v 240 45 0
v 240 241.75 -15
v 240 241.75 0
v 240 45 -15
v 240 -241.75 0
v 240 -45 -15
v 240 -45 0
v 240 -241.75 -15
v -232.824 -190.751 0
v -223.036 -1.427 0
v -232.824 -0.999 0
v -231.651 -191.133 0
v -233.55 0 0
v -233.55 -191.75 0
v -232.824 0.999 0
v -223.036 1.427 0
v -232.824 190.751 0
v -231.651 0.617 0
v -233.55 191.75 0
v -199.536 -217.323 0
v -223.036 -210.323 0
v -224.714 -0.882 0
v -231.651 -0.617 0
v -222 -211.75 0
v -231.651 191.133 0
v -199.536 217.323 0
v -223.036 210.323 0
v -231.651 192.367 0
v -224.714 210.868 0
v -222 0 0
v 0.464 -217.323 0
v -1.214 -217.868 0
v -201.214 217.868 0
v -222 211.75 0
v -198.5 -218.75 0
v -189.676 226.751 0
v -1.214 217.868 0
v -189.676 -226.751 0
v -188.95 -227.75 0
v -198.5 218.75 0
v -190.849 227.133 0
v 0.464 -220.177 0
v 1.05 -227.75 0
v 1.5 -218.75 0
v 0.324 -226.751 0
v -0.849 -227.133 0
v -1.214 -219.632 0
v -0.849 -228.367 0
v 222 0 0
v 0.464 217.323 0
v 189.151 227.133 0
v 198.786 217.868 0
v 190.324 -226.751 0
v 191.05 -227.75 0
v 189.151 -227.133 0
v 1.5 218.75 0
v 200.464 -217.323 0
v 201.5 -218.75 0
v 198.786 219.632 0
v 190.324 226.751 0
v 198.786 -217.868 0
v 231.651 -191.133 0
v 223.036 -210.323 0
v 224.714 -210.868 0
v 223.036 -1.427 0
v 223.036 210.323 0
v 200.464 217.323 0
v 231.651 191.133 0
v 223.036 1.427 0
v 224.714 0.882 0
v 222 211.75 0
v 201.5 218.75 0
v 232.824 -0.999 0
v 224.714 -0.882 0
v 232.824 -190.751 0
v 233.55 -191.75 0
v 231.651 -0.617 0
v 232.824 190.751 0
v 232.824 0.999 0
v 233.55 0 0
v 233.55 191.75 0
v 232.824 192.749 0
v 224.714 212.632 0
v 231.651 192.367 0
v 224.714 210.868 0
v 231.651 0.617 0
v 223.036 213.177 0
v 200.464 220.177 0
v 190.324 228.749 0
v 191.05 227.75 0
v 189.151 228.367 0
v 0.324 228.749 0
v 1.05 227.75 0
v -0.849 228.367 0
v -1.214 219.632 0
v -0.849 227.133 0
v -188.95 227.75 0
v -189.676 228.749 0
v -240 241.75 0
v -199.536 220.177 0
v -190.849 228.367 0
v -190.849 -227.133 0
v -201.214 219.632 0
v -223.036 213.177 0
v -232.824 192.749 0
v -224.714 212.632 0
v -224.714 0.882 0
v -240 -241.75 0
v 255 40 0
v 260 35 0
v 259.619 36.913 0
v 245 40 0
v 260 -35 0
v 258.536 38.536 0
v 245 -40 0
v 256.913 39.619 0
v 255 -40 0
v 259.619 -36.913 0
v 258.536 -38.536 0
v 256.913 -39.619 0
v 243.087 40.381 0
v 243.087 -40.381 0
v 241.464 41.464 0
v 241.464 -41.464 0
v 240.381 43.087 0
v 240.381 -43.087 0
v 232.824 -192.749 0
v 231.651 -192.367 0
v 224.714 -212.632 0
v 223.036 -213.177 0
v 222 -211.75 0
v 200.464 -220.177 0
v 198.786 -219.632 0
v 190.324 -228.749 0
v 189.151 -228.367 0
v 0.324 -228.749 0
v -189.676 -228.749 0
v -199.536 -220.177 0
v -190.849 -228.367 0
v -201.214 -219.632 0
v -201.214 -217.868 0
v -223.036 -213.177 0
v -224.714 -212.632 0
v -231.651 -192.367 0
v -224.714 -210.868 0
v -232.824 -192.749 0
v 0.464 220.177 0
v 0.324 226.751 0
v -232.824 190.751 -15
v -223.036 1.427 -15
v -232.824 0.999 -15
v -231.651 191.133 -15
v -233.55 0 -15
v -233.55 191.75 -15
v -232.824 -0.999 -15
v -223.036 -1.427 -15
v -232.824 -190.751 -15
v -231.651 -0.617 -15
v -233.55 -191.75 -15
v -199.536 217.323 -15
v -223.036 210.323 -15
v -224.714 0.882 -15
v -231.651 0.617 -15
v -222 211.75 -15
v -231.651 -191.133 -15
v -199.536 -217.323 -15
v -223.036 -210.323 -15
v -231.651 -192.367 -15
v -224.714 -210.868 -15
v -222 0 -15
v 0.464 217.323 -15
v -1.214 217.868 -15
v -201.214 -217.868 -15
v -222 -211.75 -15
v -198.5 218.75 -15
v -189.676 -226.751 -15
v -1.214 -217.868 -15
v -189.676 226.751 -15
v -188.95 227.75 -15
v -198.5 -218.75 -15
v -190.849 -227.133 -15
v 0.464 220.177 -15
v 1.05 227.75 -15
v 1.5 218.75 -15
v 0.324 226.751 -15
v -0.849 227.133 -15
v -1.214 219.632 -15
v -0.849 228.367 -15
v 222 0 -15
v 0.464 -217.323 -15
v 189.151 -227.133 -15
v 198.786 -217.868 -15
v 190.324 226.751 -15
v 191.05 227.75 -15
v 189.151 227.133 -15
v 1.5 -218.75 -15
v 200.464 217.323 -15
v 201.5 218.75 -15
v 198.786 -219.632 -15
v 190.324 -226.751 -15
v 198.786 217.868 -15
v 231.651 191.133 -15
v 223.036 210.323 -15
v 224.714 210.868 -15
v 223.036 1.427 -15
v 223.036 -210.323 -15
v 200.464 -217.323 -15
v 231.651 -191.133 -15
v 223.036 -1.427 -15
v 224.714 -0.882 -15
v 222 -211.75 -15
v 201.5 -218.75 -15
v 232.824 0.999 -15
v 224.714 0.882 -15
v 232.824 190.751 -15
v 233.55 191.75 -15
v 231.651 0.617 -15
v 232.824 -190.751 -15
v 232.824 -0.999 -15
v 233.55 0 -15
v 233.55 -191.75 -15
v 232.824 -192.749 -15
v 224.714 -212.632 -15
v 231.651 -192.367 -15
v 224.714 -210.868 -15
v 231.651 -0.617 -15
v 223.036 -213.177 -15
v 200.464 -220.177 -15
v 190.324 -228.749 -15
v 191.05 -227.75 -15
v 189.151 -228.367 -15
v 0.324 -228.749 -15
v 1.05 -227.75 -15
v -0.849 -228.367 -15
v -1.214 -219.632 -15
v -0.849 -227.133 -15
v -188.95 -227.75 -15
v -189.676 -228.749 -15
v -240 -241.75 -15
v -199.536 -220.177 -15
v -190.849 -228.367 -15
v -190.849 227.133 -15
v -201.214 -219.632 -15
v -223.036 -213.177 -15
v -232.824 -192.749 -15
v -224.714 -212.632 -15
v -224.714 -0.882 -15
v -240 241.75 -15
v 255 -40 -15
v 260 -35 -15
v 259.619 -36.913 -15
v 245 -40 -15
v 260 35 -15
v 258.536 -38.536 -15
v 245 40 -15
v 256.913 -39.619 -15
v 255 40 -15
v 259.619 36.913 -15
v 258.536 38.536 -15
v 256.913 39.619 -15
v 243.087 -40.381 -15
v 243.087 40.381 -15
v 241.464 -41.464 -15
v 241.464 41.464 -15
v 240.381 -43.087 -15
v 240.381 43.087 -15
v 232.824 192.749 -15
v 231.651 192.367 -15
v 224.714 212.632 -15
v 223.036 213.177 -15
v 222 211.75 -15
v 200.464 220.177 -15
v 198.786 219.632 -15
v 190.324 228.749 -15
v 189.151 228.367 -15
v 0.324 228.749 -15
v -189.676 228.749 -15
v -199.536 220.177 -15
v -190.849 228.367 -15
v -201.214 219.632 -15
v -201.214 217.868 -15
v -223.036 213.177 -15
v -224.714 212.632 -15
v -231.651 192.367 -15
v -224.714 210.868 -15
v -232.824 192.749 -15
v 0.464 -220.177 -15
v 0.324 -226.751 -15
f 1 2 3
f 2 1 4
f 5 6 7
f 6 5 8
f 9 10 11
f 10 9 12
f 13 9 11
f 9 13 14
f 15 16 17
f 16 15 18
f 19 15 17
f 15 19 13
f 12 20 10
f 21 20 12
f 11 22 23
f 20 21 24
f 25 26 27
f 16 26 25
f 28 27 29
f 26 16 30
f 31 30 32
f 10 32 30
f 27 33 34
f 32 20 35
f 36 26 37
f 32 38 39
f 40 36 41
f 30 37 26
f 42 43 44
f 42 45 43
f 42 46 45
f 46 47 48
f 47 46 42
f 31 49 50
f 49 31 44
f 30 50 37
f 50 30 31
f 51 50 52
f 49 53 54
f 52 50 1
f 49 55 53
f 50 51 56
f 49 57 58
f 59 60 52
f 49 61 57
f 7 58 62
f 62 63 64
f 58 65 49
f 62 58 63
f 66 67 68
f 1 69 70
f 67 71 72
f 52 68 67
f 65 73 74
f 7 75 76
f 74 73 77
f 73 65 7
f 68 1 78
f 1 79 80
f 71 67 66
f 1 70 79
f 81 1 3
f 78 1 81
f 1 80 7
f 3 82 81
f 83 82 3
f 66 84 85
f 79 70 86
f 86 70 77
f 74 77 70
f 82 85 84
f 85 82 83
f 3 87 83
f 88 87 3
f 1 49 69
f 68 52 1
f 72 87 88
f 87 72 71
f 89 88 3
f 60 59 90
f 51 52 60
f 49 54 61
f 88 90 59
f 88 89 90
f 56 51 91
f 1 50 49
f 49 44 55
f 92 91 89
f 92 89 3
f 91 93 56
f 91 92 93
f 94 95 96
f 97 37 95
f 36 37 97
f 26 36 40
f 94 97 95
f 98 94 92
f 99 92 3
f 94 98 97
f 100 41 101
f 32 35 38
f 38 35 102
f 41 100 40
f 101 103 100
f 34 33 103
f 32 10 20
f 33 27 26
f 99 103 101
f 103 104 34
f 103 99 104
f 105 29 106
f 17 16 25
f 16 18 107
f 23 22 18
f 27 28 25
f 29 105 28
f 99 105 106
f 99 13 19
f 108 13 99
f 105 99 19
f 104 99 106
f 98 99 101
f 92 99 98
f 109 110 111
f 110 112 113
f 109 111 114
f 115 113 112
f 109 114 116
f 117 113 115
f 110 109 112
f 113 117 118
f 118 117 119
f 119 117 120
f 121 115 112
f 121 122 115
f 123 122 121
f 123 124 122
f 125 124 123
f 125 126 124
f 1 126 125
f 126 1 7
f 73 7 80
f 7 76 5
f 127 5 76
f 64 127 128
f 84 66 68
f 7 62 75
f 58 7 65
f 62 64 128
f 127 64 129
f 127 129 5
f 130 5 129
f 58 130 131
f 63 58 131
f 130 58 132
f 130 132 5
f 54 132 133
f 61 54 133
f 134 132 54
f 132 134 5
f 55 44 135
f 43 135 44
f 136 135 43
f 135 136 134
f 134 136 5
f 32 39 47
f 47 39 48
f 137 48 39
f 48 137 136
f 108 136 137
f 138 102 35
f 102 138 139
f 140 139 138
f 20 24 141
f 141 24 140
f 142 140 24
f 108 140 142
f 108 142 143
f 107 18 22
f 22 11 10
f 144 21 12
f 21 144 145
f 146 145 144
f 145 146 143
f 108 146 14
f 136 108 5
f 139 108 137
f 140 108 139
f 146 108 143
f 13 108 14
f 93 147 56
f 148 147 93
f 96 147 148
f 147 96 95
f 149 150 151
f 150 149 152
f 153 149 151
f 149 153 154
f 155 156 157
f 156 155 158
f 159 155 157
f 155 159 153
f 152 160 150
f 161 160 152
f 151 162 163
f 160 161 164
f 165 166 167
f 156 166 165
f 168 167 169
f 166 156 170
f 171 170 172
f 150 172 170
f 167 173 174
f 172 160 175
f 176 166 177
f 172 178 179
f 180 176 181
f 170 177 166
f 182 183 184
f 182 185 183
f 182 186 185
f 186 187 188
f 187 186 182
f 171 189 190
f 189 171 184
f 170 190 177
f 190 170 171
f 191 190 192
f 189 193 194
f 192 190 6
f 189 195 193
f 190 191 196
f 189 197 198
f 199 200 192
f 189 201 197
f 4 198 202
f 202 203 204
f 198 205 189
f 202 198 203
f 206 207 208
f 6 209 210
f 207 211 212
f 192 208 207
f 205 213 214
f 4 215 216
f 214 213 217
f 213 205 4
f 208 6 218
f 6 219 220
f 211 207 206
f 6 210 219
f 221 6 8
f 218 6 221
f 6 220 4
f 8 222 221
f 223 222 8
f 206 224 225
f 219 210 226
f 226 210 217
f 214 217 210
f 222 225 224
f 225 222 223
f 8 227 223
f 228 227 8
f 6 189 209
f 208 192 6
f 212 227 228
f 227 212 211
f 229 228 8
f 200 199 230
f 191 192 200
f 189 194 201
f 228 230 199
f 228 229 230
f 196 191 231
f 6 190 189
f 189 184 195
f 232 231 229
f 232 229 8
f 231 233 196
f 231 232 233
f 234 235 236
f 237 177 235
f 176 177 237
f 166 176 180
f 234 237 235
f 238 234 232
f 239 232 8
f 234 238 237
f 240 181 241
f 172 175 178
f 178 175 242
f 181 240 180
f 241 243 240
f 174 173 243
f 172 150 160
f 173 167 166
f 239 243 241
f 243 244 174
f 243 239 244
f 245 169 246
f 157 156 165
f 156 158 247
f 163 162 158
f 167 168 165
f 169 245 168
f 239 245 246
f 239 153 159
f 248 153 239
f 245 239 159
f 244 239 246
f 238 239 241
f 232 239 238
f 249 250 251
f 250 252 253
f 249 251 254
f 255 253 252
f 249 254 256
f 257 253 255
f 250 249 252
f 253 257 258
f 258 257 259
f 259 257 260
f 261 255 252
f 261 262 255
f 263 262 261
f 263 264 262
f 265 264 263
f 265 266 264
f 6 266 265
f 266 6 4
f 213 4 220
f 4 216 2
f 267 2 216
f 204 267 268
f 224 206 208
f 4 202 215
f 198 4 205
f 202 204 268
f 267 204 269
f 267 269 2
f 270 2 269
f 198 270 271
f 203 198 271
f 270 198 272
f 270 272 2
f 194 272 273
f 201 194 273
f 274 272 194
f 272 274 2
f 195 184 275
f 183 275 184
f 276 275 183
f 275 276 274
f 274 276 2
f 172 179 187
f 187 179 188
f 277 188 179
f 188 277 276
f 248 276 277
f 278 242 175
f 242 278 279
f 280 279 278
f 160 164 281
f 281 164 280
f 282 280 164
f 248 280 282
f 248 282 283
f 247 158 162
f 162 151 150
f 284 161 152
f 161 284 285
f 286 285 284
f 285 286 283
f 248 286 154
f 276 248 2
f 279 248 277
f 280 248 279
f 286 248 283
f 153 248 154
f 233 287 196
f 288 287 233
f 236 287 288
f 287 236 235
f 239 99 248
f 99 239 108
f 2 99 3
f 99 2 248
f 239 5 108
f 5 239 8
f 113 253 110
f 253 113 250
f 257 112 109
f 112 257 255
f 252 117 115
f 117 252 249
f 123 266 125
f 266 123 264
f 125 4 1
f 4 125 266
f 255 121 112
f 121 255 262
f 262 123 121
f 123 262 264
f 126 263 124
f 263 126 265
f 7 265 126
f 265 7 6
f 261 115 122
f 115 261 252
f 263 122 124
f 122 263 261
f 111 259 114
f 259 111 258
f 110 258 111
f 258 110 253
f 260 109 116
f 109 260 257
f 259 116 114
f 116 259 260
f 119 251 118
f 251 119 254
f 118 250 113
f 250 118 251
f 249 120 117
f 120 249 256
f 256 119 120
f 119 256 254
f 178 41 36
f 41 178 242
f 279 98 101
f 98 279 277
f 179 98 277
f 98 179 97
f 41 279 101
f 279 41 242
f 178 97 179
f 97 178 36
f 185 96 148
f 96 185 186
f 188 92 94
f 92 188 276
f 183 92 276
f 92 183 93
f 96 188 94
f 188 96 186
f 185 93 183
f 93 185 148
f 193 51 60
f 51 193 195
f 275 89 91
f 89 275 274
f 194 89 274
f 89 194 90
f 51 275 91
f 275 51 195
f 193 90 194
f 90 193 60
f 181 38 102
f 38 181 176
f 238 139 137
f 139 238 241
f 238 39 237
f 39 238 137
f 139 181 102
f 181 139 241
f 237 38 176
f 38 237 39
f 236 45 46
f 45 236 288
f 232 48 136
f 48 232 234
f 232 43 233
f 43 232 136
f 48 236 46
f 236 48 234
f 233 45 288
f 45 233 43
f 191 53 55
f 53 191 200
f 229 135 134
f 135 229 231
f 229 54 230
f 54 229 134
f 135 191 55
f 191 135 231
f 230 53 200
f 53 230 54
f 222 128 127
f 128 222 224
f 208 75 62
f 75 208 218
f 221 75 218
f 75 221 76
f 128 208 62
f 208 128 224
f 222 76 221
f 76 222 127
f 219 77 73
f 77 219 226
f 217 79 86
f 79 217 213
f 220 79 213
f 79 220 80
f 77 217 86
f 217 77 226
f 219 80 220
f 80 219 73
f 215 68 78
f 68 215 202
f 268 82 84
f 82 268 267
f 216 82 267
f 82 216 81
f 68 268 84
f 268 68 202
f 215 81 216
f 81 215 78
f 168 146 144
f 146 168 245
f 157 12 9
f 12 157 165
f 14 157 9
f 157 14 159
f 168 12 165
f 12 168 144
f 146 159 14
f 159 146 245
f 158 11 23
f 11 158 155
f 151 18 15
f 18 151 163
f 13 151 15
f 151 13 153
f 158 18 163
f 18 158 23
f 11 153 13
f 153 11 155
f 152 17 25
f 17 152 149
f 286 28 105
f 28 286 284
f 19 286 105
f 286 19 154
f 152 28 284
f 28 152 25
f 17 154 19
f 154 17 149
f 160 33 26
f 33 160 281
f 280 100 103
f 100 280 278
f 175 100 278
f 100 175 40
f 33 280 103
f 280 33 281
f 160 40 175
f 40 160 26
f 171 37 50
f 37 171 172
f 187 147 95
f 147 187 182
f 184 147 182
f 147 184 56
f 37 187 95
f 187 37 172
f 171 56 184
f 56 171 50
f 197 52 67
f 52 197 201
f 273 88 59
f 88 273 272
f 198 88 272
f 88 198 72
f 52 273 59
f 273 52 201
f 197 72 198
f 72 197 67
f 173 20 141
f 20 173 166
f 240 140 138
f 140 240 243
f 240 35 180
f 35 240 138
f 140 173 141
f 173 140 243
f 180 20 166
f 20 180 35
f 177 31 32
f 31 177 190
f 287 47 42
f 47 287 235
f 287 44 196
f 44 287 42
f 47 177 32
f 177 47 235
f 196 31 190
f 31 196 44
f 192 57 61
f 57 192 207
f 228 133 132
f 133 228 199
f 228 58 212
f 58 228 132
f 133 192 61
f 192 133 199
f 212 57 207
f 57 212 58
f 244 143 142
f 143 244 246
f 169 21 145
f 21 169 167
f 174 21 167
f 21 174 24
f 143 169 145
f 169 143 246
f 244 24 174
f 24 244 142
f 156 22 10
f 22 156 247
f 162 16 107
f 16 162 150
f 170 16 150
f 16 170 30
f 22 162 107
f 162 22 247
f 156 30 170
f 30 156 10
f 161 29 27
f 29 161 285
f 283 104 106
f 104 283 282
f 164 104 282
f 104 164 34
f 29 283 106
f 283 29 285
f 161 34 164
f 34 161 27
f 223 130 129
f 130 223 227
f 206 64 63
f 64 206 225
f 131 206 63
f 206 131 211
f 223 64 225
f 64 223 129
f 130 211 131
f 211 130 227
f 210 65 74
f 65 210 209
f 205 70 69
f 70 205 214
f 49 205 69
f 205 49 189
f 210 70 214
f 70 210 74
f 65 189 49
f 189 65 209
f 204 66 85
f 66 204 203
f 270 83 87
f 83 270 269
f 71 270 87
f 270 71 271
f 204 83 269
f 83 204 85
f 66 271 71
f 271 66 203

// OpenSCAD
// file: variabile.scad
//parametrii generali
latime_exterioara_dulap = 500; //mm
adancime_exterioara_dulap = 500; //mm
inaltime_utila_segment_dulap = 90; //inaltimea utila minima
numar_segmente_dulap = 4;

//definitii legate de materiale
grosime_exterior_dulap = 15;
grosime_fund_sertar = 15;
grosime_laterale_sertar = 15;

//gauri de surub si cap surub
diametru_gauri_holzsurub = 2.1;
diametru_gauri_surub = 2.1; //doar pt ghidare, dau gaura cu 8mm lemn
diametru_cap_surub = 20;
// calculez adancimea din datele surubului
lungime_filet_surub = 20; //mm
lungime_filet_ramas = 10; //mm, cat ramane pentru piulita
adancime_cap_surub = (grosime_laterale_sertar - (lungime_filet_surub-lungime_filet_ramas)/2);
echo();
echo("adancime_cap_surub:", adancime_cap_surub);
echo();

// dimensiuni slot-uri
grosime_slot_sertar = grosime_fund_sertar + 1; //1mm toleranta
adancime_slot_sertar = 6;

/*
    variabile specifice dulapului exterior
*/
//variabile specifice lateralei de dulap
inaltime_initiala = 1;// primul slot pleaca putin deasupra fundului
inaltime_segment_dulap = inaltime_utila_segment_dulap + grosime_slot_sertar;
inaltime_laterala = 2*grosime_exterior_dulap + inaltime_initiala + inaltime_segment_dulap*numar_segmente_dulap;
echo();
echo("inaltime_segment_dulap: ",inaltime_segment_dulap);
echo("inaltime_laterala: ",inaltime_laterala);
echo();

numar_suruburi_capace_sus_jos = 5;
offset_suruburi_capace_sus_jos = 30; // de la marginea placii la centrul primei gauri
//distanta_fata_de_centru_gauri_laterale = 100;
distanta_fata_de_centru_gauri_laterale =adancime_exterioara_dulap/3;
pozitie_gauri_de_sus = 2; // sloturi
pozitie_gauri_de_jos = 1; // sloturi


//variabile specifice capacelor de sus si jos
adancime_capac_sus_jos = adancime_exterioara_dulap; //mm
latime_capac_sus_jos = latime_exterioara_dulap - 2*grosime_exterior_dulap;
numar_suruburi_capac_fund = 5; // in cate suruburi fixez fundul
offset_suruburi_fund = 30; // de la marginea bucatii la centrul primei gauri
distanta_suruburi_fixare_module_sus_jos = adancime_capac_sus_jos/3; //mm

gauri_fixare_picioare = true;
distanta_gauri_picioare_centru_centru = 50;
latime_suport_picioare = 80;
offset_fata = 30; // de la marginea din fata 
offset_laterala = 30; // de la peretele lateral


//variabile specifice fundului de dulap
distanta_suruburi_fixare_fund = 200; //mm or undef if not required
adancime_fund = inaltime_laterala - 2*grosime_exterior_dulap;
latime_fund = latime_exterioara_dulap - 2*grosime_exterior_dulap;




/*
    variabile specifice sertarelor
*/
// trebui ajustata in functie de dulap si grosimile reale
// la placajul meu,se mai aduna 2mm 
toleranta_fund_sertar_laterale = -1.5;//mm - se imparte la 2 pt cele 2 margini
toleranta_adancime_fund_sertar = 5;//mm - sertarul e putin mai scurt
toleranta_pereti_sertar = 0.5; // de fiecare parte, intre dulap si sertar
adancime_maner_fund_sertar = 20;// cat iese manerul in afara
latime_maner_fund_sertar = 80;
raza_rotunjire_maner_fund_sertar=5;

// gauri folosite la ansamblarea sertarului
diametru_gauri_aliniere_margini_sertar=3;
foloseste_pini_aliniere_laterala_lunga = true;
numar_gauri_aliniere_laterala_lunga=3;
offset_gauri_aliniere_laterala_lunga=40;
foloseste_pini_aliniere_laterala_scurta = true;
numar_gauri_aliniere_laterala_scurta=3;
offset_gauri_aliniere_laterala_scurta=30;

// dimensiunile fundului de sertar
adancime_fund_sertar = adancime_capac_sus_jos-grosime_exterior_dulap-toleranta_adancime_fund_sertar;
// e echivalenta cu latimea capacelor sus/jos + adancime sloturi - toleranta in lateral
latime_fund_sertar = (latime_exterioara_dulap - 2*grosime_exterior_dulap) + 2*adancime_slot_sertar-toleranta_fund_sertar_laterale;
echo("adancime_fund_sertar:",adancime_fund_sertar);
echo("latime_fund_sertar:", latime_fund_sertar);

// parametrii pentru gaurile ce fixeaza laterala lunga in fundul de sertar
gauri_fixare_laterala_lunga_sertar = true; // pune false ca sa dispara gaurile
offset_gauri_laterala_lunga_fund_sertar = 50;// de la margini, locatia primei gauri
numar_gauri_laterala_lunga_fund_sertar = 3; // numar impar neaparat, >1
assert(numar_gauri_laterala_lunga_fund_sertar>1, "numar_gauri_laterala_lunga_fund_sertar trebuie sa fie mai mare ca 1");
assert(1==numar_gauri_laterala_lunga_fund_sertar%2,"numar_gauri_laterala_lunga_fund_sertar trebuie sa fie un numar impar");

// parametrii pentru gaurile ce fixeaza laterala scurta in fundul de sertar
gauri_fixare_laterala_scurta_sertar = true; // pune false ca sa dispara
offset_gauri_laterala_scurta_fund_sertar = 50;
numar_gauri_laterala_scurta_fund_sertar = 3;
assert(numar_gauri_laterala_scurta_fund_sertar>1,"numar_gauri_laterala_scurta_fund_sertar trebuie sa fie mai mare ca 1");
assert(1==numar_gauri_laterala_scurta_fund_sertar%2,"numar_gauri_laterala_scurta_fund_sertar trebuie sa fie numar impar");

// parametrii pentru laterala lunga de sertar
numar_gauri_fixare_laterala_lunga_in_scurta = 1; // 1 sau numar impar
offset_gauri_laterala_lunga_in_scurta = 0;
assert(1==numar_gauri_fixare_laterala_lunga_in_scurta%2, "numar_gauri_fixare_laterala_lunga_in_scurta trebuie sa fie numar impar");

// functii auxiliare
/*
    formeaza obiectul ce contine capul de surub si surubul
    obiectul se scade din placa de baza
*/
module gauraCompusaLaterala() {
    union() {
        translate([0,0,-adancime_cap_surub/2])
            cylinder(h=adancime_cap_surub, r=diametru_cap_surub/2, center=true);
        translate([0,0,-grosime_exterior_dulap/2])
            cylinder(h=grosime_exterior_dulap , r=diametru_gauri_surub/2,center=true);
    }
}
// main file
include <variabile.scad>

/*
    obiectul de baza include manerul
*/
module obiectDeBaza() {
    union() {
        translate([0,0, -grosime_fund_sertar/2])
            cube([adancime_fund_sertar, latime_fund_sertar ,grosime_fund_sertar], true);
        translate([adancime_fund_sertar/2+adancime_maner_fund_sertar/2,0,-grosime_fund_sertar/2])
            cube([adancime_maner_fund_sertar, latime_maner_fund_sertar, grosime_fund_sertar],true);
    }
}


/*
    blocul asta formeaza niste fillet-uri mici in colturile vizibile
*/
module piesaRotunjireExteriorManer() {
    translate([adancime_fund_sertar/2+adancime_maner_fund_sertar-raza_rotunjire_maner_fund_sertar,latime_maner_fund_sertar/2-raza_rotunjire_maner_fund_sertar,-grosime_fund_sertar/2])
        difference() {
            translate([0,0,-grosime_fund_sertar/2])
            cube([raza_rotunjire_maner_fund_sertar,raza_rotunjire_maner_fund_sertar, grosime_fund_sertar]);
            cylinder(h = grosime_fund_sertar, r=raza_rotunjire_maner_fund_sertar, center=true);
        }
}

module piesaRotunjireInteriorManer() {
    translate([adancime_fund_sertar/2+raza_rotunjire_maner_fund_sertar, latime_maner_fund_sertar/2+raza_rotunjire_maner_fund_sertar, -grosime_fund_sertar/2])
    rotate([0,0,-180])
    difference() {
        translate([0,0,-grosime_fund_sertar/2])
        cube([raza_rotunjire_maner_fund_sertar, raza_rotunjire_maner_fund_sertar, grosime_fund_sertar]);
        cylinder(h = grosime_fund_sertar, r=raza_rotunjire_maner_fund_sertar, center=true);
        
    }
}


/*
    sirul de gauri pentru laterala lunga
*/
module gauriLateralaLungaFundSertar() {
    // aici stabilesc unde vine linia suruburilor
    offsetY = latime_fund_sertar/2 - adancime_slot_sertar - toleranta_pereti_sertar - grosime_laterale_sertar/2;
    lungimeUtilizabila = adancime_fund_sertar-2*offset_gauri_laterala_lunga_fund_sertar;
    pas = lungimeUtilizabila/(numar_gauri_laterala_lunga_fund_sertar-1);
    for(cnt=[0:1:numar_gauri_laterala_lunga_fund_sertar-1]) {
        pozitieX = -1*(adancime_fund_sertar/2-offset_gauri_laterala_lunga_fund_sertar) + cnt*pas;
        translate([pozitieX,offsetY,-grosime_fund_sertar/2])
        cylinder(h=grosime_fund_sertar, r=diametru_gauri_holzsurub/2, center=true);
    }
}

/*
    sirul de gauri pentru laterala scurta
*/
module gauriLateralaScurtaFundSertar() {
    offsetX = adancime_fund_sertar/2 - grosime_laterale_sertar/2;
    lungimeUtilizabila = latime_fund_sertar - 2*offset_gauri_laterala_scurta_fund_sertar;
    pas = lungimeUtilizabila / (numar_gauri_laterala_scurta_fund_sertar-1);
    for(cnt=[0:1:(numar_gauri_laterala_scurta_fund_sertar-1)]) {
        pozitieY = -1*(latime_fund_sertar/2-offset_gauri_laterala_scurta_fund_sertar) + pas *cnt;
        translate([offsetX,pozitieY,-grosime_fund_sertar/2])
        cylinder(h=grosime_fund_sertar, r=diametru_gauri_holzsurub/2, center=true);
    }
}


/*
    setul de gauri care e folosit pentru alinierea lateralelor

    numar_gauri_aliniere_laterala_scurta=3;
    offset_gauri_aliniere_laterala_scurta=50;
*/
module gauriAliniereLateralaLungaLaMontare() {
    offsetY = latime_fund_sertar/2 - adancime_slot_sertar - toleranta_pereti_sertar - grosime_laterale_sertar - diametru_gauri_aliniere_margini_sertar/2;
    distantaUtila = adancime_fund_sertar-2*offset_gauri_aliniere_laterala_lunga;
    pas = distantaUtila / (numar_gauri_aliniere_laterala_lunga-1);
    for(cnt=[0:1:(numar_gauri_aliniere_laterala_lunga-1)]) {
        pozitieX = -1*(adancime_fund_sertar/2 - offset_gauri_aliniere_laterala_lunga) + pas*cnt;
        translate([pozitieX,offsetY,-grosime_fund_sertar/2])
            cylinder(h=grosime_fund_sertar, r=diametru_gauri_aliniere_margini_sertar/2, center=true);
    }
}


module gauriAliniereLateralaScurtaLaMontare() {
    pozitieX = -adancime_fund_sertar/2 + grosime_laterale_sertar+diametru_gauri_aliniere_margini_sertar/2;
    distantaUtila = latime_fund_sertar - 2*offset_gauri_aliniere_laterala_scurta;
    pas = distantaUtila / (numar_gauri_aliniere_laterala_lunga-1);
    for(cnt=[0:1:(numar_gauri_aliniere_laterala_lunga-1)]) {
        pozitieY = -1*(latime_fund_sertar/2-offset_gauri_aliniere_laterala_scurta) + cnt*pas;
        translate([pozitieX,pozitieY,-grosime_fund_sertar/2])
            cylinder(h=grosime_fund_sertar, r=diametru_gauri_aliniere_margini_sertar/2, center=true);
    }
}




difference() {
    union() {
        obiectDeBaza();
        piesaRotunjireInteriorManer();
        mirror([0,1,0]) piesaRotunjireInteriorManer();
    }
    piesaRotunjireExteriorManer();
    mirror([0,1,0]) piesaRotunjireExteriorManer();
    if(true==gauri_fixare_laterala_lunga_sertar) {
        gauriLateralaLungaFundSertar();
        mirror([0,1,0]) gauriLateralaLungaFundSertar();
    }
    if(true == gauri_fixare_laterala_scurta_sertar) {
        gauriLateralaScurtaFundSertar();
        mirror([1,0,0]) gauriLateralaScurtaFundSertar();
    }
    if(true == foloseste_pini_aliniere_laterala_lunga) {
        gauriAliniereLateralaLungaLaMontare();
        mirror([0,1,0]) gauriAliniereLateralaLungaLaMontare();
    }
    if(true ==foloseste_pini_aliniere_laterala_scurta) {
        gauriAliniereLateralaScurtaLaMontare();
        mirror([1,0,0]) gauriAliniereLateralaScurtaLaMontare();
    }
}
